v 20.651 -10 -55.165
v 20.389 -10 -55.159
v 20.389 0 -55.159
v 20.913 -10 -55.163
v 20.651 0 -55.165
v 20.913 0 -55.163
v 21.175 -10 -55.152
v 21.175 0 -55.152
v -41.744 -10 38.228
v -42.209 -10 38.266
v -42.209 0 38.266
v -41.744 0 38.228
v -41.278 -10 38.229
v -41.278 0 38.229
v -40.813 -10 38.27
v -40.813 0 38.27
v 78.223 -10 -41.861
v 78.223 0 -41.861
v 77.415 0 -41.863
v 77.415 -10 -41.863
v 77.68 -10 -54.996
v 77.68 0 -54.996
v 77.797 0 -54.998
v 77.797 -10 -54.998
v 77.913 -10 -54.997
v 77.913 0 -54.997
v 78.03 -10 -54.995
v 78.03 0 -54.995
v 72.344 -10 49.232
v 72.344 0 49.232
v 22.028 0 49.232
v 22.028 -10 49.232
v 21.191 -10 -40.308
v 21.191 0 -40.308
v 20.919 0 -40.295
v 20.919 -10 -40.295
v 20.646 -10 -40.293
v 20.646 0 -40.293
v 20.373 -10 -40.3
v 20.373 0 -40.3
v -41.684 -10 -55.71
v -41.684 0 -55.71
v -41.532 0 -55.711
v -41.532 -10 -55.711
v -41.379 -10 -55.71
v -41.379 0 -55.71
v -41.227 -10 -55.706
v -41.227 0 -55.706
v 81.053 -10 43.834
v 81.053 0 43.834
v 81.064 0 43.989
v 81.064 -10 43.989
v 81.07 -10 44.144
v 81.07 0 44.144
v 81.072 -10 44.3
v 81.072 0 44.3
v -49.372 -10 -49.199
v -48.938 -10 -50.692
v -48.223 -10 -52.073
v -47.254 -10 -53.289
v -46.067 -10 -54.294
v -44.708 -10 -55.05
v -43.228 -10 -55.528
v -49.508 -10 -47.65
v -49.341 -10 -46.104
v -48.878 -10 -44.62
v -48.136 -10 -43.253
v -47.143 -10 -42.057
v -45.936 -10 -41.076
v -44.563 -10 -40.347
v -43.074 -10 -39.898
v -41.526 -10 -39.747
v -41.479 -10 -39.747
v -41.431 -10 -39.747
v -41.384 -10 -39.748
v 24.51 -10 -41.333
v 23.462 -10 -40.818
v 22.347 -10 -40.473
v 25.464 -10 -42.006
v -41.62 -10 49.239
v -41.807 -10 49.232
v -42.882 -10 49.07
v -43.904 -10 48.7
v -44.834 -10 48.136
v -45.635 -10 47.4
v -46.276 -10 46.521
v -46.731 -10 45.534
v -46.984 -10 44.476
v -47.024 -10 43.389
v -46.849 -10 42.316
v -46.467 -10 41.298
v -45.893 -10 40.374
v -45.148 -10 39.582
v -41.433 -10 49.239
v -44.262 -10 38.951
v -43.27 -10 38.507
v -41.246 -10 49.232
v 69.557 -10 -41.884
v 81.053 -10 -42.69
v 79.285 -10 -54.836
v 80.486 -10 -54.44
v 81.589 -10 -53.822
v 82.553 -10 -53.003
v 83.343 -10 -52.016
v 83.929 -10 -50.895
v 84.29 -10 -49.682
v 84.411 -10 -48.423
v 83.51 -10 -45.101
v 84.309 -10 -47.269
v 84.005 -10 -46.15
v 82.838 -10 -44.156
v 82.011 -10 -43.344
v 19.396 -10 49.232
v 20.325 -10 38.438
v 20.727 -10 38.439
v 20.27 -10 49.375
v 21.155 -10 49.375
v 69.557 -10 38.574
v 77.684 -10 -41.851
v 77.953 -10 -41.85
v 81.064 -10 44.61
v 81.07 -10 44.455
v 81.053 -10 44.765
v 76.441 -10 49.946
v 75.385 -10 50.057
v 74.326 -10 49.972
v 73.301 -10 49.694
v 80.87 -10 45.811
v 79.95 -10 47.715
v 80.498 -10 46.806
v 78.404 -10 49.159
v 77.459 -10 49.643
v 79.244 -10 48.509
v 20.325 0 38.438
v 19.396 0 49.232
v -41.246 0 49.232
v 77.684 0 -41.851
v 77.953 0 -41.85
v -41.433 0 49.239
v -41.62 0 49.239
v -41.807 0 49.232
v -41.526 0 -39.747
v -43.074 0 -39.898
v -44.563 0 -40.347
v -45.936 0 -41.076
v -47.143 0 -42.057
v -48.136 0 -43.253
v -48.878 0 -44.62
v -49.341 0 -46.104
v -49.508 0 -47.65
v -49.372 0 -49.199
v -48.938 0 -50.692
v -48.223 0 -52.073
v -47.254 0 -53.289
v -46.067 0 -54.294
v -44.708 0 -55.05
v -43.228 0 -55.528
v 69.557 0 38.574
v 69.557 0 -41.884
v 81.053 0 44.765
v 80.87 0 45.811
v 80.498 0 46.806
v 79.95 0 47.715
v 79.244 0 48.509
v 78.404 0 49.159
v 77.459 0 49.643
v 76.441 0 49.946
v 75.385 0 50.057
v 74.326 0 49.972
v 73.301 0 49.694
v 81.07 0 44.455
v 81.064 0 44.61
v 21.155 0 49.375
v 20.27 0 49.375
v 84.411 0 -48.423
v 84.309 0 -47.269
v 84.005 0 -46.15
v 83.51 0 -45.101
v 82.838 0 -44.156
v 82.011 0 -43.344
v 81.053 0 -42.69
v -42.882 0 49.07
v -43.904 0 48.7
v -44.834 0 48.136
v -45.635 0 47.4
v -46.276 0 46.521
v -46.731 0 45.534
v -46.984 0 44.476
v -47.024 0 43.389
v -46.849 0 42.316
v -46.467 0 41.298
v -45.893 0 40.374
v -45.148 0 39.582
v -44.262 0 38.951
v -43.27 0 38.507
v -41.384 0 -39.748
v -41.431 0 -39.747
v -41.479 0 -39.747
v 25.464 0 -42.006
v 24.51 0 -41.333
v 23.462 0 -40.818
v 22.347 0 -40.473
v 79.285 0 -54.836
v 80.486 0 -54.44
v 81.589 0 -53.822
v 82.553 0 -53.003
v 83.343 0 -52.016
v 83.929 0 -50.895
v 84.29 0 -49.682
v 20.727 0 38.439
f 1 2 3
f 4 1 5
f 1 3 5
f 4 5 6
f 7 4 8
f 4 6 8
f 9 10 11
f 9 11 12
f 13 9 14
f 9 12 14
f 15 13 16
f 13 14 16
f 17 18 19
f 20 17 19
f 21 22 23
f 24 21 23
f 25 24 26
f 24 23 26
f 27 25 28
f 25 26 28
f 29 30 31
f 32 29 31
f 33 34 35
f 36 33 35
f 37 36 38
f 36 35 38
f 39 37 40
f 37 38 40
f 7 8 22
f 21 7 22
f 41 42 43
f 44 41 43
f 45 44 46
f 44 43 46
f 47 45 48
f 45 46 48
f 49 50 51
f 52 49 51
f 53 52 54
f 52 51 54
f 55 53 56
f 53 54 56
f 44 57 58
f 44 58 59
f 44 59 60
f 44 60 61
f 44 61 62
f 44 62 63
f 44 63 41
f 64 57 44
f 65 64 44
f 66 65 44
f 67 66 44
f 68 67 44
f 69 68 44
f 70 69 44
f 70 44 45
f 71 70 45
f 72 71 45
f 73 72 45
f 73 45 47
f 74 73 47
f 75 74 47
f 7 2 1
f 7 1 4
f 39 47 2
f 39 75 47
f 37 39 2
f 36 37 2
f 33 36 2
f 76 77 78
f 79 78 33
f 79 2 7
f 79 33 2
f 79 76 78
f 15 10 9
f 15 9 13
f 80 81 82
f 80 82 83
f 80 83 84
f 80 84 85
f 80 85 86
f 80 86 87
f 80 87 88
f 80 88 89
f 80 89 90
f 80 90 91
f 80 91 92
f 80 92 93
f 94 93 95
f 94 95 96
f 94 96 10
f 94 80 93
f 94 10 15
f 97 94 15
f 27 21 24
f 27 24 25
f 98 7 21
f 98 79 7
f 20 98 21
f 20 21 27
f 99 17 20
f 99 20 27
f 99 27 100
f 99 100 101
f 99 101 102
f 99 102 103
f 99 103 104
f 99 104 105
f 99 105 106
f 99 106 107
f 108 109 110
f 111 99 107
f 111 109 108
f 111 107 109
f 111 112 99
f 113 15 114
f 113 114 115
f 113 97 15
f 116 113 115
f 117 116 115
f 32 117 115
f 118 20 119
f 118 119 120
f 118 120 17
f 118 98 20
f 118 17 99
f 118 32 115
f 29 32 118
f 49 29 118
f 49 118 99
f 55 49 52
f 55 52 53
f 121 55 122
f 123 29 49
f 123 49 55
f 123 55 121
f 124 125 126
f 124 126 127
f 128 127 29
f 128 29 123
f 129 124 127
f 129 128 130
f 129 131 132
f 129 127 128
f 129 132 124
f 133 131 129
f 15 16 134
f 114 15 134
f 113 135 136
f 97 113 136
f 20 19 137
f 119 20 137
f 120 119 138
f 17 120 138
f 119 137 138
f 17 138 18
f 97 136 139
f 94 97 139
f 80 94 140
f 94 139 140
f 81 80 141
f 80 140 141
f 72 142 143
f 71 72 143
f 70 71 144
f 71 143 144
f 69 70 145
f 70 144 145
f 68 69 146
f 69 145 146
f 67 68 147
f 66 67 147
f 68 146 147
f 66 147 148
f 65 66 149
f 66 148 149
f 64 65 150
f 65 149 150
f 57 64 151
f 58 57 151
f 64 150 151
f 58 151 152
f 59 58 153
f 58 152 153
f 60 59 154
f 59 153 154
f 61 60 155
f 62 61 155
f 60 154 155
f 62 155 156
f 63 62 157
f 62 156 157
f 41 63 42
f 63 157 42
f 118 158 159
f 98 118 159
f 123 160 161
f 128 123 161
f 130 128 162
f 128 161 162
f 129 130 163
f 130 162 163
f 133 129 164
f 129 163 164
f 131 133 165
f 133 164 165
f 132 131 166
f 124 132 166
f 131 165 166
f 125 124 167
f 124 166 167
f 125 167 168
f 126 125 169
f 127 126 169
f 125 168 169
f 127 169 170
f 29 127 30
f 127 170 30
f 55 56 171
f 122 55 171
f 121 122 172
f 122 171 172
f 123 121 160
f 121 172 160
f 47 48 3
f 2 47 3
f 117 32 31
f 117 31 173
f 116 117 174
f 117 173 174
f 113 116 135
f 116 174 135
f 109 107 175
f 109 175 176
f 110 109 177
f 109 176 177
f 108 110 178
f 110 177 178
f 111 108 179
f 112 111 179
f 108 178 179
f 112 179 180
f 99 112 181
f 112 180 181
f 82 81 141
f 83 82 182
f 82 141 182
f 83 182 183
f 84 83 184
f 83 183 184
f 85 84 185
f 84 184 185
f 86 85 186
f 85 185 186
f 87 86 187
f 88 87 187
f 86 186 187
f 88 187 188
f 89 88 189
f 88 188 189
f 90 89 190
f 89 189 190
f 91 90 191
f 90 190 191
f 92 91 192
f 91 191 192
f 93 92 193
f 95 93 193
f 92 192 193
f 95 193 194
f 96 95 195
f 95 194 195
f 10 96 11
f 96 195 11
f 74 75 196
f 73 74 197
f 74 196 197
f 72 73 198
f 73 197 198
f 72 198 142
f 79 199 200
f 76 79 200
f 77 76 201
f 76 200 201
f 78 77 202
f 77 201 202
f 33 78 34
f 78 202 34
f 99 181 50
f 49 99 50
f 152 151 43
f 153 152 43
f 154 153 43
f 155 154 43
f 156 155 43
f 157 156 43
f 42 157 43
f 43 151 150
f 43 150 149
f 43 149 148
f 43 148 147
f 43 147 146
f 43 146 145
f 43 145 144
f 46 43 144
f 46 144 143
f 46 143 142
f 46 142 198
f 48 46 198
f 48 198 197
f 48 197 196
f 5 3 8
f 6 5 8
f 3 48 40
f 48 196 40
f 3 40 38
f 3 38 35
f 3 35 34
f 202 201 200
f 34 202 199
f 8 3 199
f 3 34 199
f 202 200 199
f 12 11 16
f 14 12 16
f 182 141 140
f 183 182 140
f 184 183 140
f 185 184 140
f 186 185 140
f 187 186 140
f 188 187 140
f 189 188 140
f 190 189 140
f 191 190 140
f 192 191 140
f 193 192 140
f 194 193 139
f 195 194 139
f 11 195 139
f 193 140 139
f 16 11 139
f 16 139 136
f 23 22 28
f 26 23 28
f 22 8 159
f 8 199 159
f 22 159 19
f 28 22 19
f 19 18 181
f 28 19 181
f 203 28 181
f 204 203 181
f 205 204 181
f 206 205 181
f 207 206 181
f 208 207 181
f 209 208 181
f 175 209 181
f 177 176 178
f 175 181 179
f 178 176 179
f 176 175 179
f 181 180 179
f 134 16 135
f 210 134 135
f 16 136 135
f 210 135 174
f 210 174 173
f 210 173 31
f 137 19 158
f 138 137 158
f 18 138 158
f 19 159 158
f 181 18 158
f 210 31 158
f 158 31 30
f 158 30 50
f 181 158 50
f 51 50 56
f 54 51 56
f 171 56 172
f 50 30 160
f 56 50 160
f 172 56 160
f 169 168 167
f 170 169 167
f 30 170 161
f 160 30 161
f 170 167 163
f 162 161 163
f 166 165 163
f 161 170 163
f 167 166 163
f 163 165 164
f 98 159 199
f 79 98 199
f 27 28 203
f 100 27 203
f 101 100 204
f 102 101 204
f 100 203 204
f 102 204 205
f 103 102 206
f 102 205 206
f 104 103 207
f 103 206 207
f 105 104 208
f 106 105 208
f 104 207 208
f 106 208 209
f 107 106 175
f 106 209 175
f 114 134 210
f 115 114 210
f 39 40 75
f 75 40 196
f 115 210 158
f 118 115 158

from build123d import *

# Parameters (mm, degrees)
F1_DEPTH = 10


with BuildPart() as f1:
    # F0 (on Front) → F1 (new body)
    with BuildSketch(Plane.XZ):
        with BuildLine():
            Line((-41.2459699212, 49.2324725474), (-41.8065555243, 49.2324725474))
            ThreePointArc((-41.8065555243, 49.2324725474), (-47.0306271881, 43.9337496798), (-42.2094407409, 38.2659855689))
            Line((-42.2094407409, 38.2659855689), (-40.8129731674, 38.2698337294))
            ThreePointArc((-40.8129731674, 38.2698337294), (-37.3869527055, 40.0976581171), (-36.018184972, 43.7315311321))
            ThreePointArc((-36.018184972, 43.7315311321), (-37.5335947518, 47.5259379346), (-41.2459699212, 49.2324725474))
        make_face()
        with BuildLine():
            ThreePointArc((-41.2459699212, 49.2324725474), (-41.5262627227, 49.2396088829), (-41.8065555243, 49.2324725474))
            Line((-41.8065555243, 49.2324725474), (-41.2459699212, 49.2324725474))
        make_face()
        with BuildLine():
            Line((-40.8129731674, 38.2698337294), (-42.2094407409, 38.2659855689))
            ThreePointArc((-42.2094407409, 38.2659855689), (-41.5110845063, 38.2234742941), (-40.8129731674, 38.2698337294))
        make_face()
        with BuildLine():
            Line((19.3958776676, 49.2324725474), (-41.2459699212, 49.2324725474))
            ThreePointArc((-41.2459699212, 49.2324725474), (-37.5335947518, 47.5259379346), (-36.018184972, 43.7315311321))
            ThreePointArc((-36.018184972, 43.7315311321), (-37.3869527055, 40.0976581171), (-40.8129731674, 38.2698337294))
            Line((-40.8129731674, 38.2698337294), (20.3249844191, 38.4383078715))
            Line((20.3249844191, 38.4383078715), (20.7272791052, 38.4394164505))
            ThreePointArc((20.7272791052, 38.4394164505), (15.2765817998, 43.2456806036), (19.3958776676, 49.2324725474))
        make_face()
        with BuildLine():
            ThreePointArc((22.0284968869, 49.2324725474), (20.7121872773, 49.3930079541), (19.3958776676, 49.2324725474))
            Line((19.3958776676, 49.2324725474), (20.0357145698, 49.2324725474))
            Line((20.0357145698, 49.2324725474), (22.0284968869, 49.2324725474))
        make_face()
        with BuildLine():
            Line((20.0357145698, 49.2324725474), (19.3958776676, 49.2324725474))
            ThreePointArc((19.3958776676, 49.2324725474), (15.2765817998, 43.2456806036), (20.7272791052, 38.4394164505))
            ThreePointArc((20.7272791052, 38.4394164505), (24.5902061403, 40.0488544865), (26.1889934258, 43.9162018055))
            ThreePointArc((26.1889934258, 43.9162018055), (25.0252243831, 47.2915708983), (22.0284968869, 49.2324725474))
            Line((22.0284968869, 49.2324725474), (20.0357145698, 49.2324725474))
        make_face()
        with BuildLine():
            Line((72.3443325591, 49.2324725474), (22.0284968869, 49.2324725474))
            ThreePointArc((22.0284968869, 49.2324725474), (25.0252243831, 47.2915708983), (26.1889934258, 43.9162018055))
            ThreePointArc((26.1889934258, 43.9162018055), (24.5902061403, 40.0488544865), (20.7272791052, 38.4394164505))
            Line((20.7272791052, 38.4394164505), (69.5565042771, 38.5739721692))
            Line((69.5565042771, 38.5739721692), (69.5565042771, 44.2997200327))
            ThreePointArc((69.5565042771, 44.2997200327), (70.3016811147, 47.1327411189), (72.3443325591, 49.2324725474))
        make_face()
        with BuildLine():
            ThreePointArc((81.0534632591, 44.7649656204), (77.942418688, 49.4228865599), (72.3443325591, 49.2324725474))
            ThreePointArc((72.3443325591, 49.2324725474), (70.3016811147, 47.1327411189), (69.5565042771, 44.2997200327))
            ThreePointArc((69.5565042771, 44.2997200327), (70.993741542, 40.4937686642), (74.5879509602, 38.58783702))
            ThreePointArc((74.5879509602, 38.58783702), (78.9425359244, 39.8287087647), (81.0534632591, 43.8344744449))
            Line((81.0534632591, 43.8344744449), (81.0534632591, 44.7649656204))
        make_face()
        with BuildLine():
            Line((69.5565042771, 44.2997200327), (69.5565042771, 38.5739721692))
            Line((69.5565042771, 38.5739721692), (74.5879509602, 38.58783702))
            ThreePointArc((74.5879509602, 38.58783702), (70.993741542, 40.4937686642), (69.5565042771, 44.2997200327))
        make_face()
        with BuildLine():
            Line((74.5879509602, 38.58783702), (69.5565042771, 38.5739721692))
            Line((69.5565042771, 38.5739721692), (69.5565042771, -41.8843869054))
            Line((69.5565042771, -41.8843869054), (77.41492293, -41.8627319403))
            ThreePointArc((77.41492293, -41.8627319403), (77.8187709933, -41.8492012292), (78.2226874942, -41.8605060327))
            ThreePointArc((78.2226874942, -41.8605060327), (79.6851867949, -42.1143399773), (81.0534632591, -42.689801004))
            Line((81.0534632591, -42.689801004), (81.0534632591, 43.8344744449))
            ThreePointArc((81.0534632591, 43.8344744449), (78.9425359244, 39.8287087647), (74.5879509602, 38.58783702))
        make_face()
        with BuildLine():
            ThreePointArc((81.0722902774, 44.2997200327), (81.0675815975, 44.5325332161), (81.0534632591, 44.7649656204))
            Line((81.0534632591, 44.7649656204), (81.0534632591, 43.8344744449))
            ThreePointArc((81.0534632591, 43.8344744449), (81.0675815975, 44.0669068492), (81.0722902774, 44.2997200327))
        make_face()
        with BuildLine():
            Line((77.41492293, -41.8627319403), (69.5565042771, -41.8843869054))
            Line((69.5565042771, -41.8843869054), (25.4644663722, -42.005888646))
            ThreePointArc((25.4644663722, -42.005888646), (27.4470484848, -44.5675644173), (28.1525257136, -47.7290698293))
            ThreePointArc((28.1525257136, -47.7290698293), (26.1341587579, -52.8227999815), (21.1746559331, -55.1515815863))
            Line((21.1746559331, -55.1515815863), (77.680068251, -54.9958730667))
            ThreePointArc((77.680068251, -54.9958730667), (71.2639429971, -48.556161307), (77.41492293, -41.8627319403))
        make_face()
        with BuildLine():
            Line((78.2226874942, -41.8605060327), (77.41492293, -41.8627319403))
            ThreePointArc((77.41492293, -41.8627319403), (71.2639429971, -48.556161307), (77.680068251, -54.9958730667))
            Line((77.680068251, -54.9958730667), (78.0299260429, -54.9949089849))
            ThreePointArc((78.0299260429, -54.9949089849), (82.5533635979, -53.0034225515), (84.4111709763, -48.4234599673))
            ThreePointArc((84.4111709763, -48.4234599673), (83.5099767883, -45.1012225352), (81.0534632591, -42.689801004))
            ThreePointArc((81.0534632591, -42.689801004), (79.6851867949, -42.1143399773), (78.2226874942, -41.8605060327))
        make_face()
        with BuildLine():
            ThreePointArc((28.1525257136, -47.7290698293), (27.4470484848, -44.5675644173), (25.4644663722, -42.005888646))
            ThreePointArc((25.4644663722, -42.005888646), (23.4623029685, -40.8181243584), (21.1910051796, -40.3075867475))
            Line((21.1910051796, -40.3075867475), (20.3734561107, -40.3002775684))
            ThreePointArc((20.3734561107, -40.3002775684), (13.2791728637, -47.7368050161), (20.3889108114, -55.1585582849))
            Line((20.3889108114, -55.1585582849), (21.1746559331, -55.1515815863))
            ThreePointArc((21.1746559331, -55.1515815863), (26.1341587579, -52.8227999815), (28.1525257136, -47.7290698293))
        make_face()
        with BuildLine():
            Line((78.0299260429, -54.9949089849), (77.680068251, -54.9958730667))
            ThreePointArc((77.680068251, -54.9958730667), (77.8550035612, -54.9977187055), (78.0299260429, -54.9949089849))
        make_face()
        with BuildLine():
            Line((20.3734561107, -40.3002775684), (21.1910051796, -40.3075867475))
            ThreePointArc((21.1910051796, -40.3075867475), (20.7823311667, -40.2926885818), (20.3734561107, -40.3002775684))
        make_face()
        with BuildLine():
            ThreePointArc((20.3889108114, -55.1585582849), (20.7818755833, -55.1654551359), (21.1746559331, -55.1515815863))
            Line((21.1746559331, -55.1515815863), (20.3889108114, -55.1585582849))
        make_face()
        with BuildLine():
            ThreePointArc((20.3889108114, -55.1585582849), (13.2791728637, -47.7368050161), (20.3734561107, -40.3002775684))
            Line((20.3734561107, -40.3002775684), (-41.3835467647, -39.7481480292))
            ThreePointArc((-41.3835467647, -39.7481480292), (-35.8317624102, -42.1354889714), (-33.5440649914, -47.7290698293))
            ThreePointArc((-33.5440649914, -47.7290698293), (-34.1207054737, -50.7078619424), (-35.7673129619, -53.2562733061))
            ThreePointArc((-35.7673129619, -53.2562733061), (-38.2588759048, -55.0119033441), (-41.226844648, -55.7056498884))
            Line((-41.226844648, -55.7056498884), (20.3889108114, -55.1585582849))
        make_face()
        with BuildLine():
            Line((-41.5262627227, -39.7468720979), (-41.3835467647, -39.7481480292))
            ThreePointArc((-41.3835467647, -39.7481480292), (-41.454901892, -39.7471910871), (-41.5262627227, -39.7468720979))
        make_face()
        with BuildLine():
            ThreePointArc((-33.5440649914, -47.7290698293), (-35.8317624102, -42.1354889714), (-41.3835467647, -39.7481480292))
            Line((-41.3835467647, -39.7481480292), (-41.5262627227, -39.7468720979))
            ThreePointArc((-41.5262627227, -39.7468720979), (-49.5080707965, -47.6501997041), (-41.6839952729, -55.7097089682))
            Line((-41.6839952729, -55.7097089682), (-35.7673129619, -53.2562733061))
            ThreePointArc((-35.7673129619, -53.2562733061), (-34.1207054737, -50.7078619424), (-33.5440649914, -47.7290698293))
        make_face()
        with BuildLine():
            Line((-41.6839952729, -55.7097089682), (-41.226844648, -55.7056498884))
            ThreePointArc((-41.226844648, -55.7056498884), (-38.2588759048, -55.0119033441), (-35.7673129619, -53.2562733061))
            Line((-35.7673129619, -53.2562733061), (-41.6839952729, -55.7097089682))
        make_face()
        with BuildLine():
            ThreePointArc((-41.6839952729, -55.7097089682), (-41.4553908947, -55.7109529283), (-41.226844648, -55.7056498884))
            Line((-41.226844648, -55.7056498884), (-41.6839952729, -55.7097089682))
        make_face()
    extrude(amount=F1_DEPTH)


solid = f1.part
